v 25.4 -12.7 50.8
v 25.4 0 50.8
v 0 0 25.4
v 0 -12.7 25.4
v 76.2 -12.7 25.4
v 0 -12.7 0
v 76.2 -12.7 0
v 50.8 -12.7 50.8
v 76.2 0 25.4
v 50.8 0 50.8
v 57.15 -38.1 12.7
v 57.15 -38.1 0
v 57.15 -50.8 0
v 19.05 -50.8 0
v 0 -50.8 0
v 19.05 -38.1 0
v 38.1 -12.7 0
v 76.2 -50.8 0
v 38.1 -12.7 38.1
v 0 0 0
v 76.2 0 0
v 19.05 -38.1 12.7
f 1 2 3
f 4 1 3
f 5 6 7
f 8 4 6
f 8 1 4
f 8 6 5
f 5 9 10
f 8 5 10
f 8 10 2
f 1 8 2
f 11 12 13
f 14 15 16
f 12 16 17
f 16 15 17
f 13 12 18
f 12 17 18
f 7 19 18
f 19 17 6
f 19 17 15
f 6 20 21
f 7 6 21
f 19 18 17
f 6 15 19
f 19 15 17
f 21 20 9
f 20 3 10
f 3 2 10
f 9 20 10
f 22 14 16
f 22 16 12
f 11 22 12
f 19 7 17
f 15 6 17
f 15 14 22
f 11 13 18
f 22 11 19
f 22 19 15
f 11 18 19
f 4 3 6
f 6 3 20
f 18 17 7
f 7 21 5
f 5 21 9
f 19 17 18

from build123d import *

# Parameters (mm, degrees)
F1_DEPTH       = 12.7
F3_DEPTH       = 38.1
F5_DEPTH       = 76.201
F7_DEPTH       = 38.1
F9_DEPTH       = 25.4
F9_DEPTH_BACK  = 25.4
F10_DEPTH      = 25.4
F10_DEPTH_BACK = 25.4


with BuildPart() as f1:
    # F0 (on Front) → F1 (new body)
    with BuildSketch(Plane.XZ):
        Polygon((0, 25.4), (0, 0), (76.2, 0), (76.2, 25.4), (50.8, 50.8), (25.4, 50.8), align=None)
    extrude(amount=F1_DEPTH)


with BuildPart() as f3:
    # F2 (on Top) → F3 (new body)
    with BuildSketch(Plane.XY):
        Polygon((38.1, -12.7), (0, -50.8), (19.05, -50.8), (19.05, -38.1), (57.15, -38.1), (57.15, -50.8), (76.2, -50.8), align=None)
    extrude(amount=F3_DEPTH)

    # F4 (on face) → F5 (cut, through all)
    with BuildSketch(Plane.YZ.offset(76.2)):
        Polygon((-50.8, 38.1), (-50.8, 0), (-12.7, 38.1), align=None)
    extrude(amount=-F5_DEPTH, mode=Mode.SUBTRACT)


with BuildPart() as f7:
    # F6 (on Top) → F7 (new body)
    with BuildSketch(Plane.XY):
        Polygon((38.1, -12.7), (0, -12.7), (0, -50.8), align=None)
    extrude(amount=F7_DEPTH)

    # F8 (on face) → F9 (cut, two sides)
    with BuildSketch(Plane.XZ.offset(38.1)) as f9_sk:
        Polygon((0, 0), (38.1, 38.1), (0, 38.1), align=None)
    extrude(amount=-F9_DEPTH, mode=Mode.SUBTRACT)
    extrude(f9_sk.sketch, amount=F9_DEPTH_BACK, mode=Mode.SUBTRACT)


with BuildPart() as f7b:
    # F6 (on Top) → F7, piece 2 (new body)
    with BuildSketch(Plane.XY):
        Polygon((76.2, -12.7), (38.1, -12.7), (76.2, -50.8), align=None)
    extrude(amount=F7_DEPTH)

    # F8 (on face) → F10 (cut, two sides)
    with BuildSketch(Plane.XZ.offset(38.1)) as f10_sk:
        Polygon((76.2, 38.1), (38.1, 38.1), (76.2, 0), align=None)
    extrude(amount=-F10_DEPTH, mode=Mode.SUBTRACT)
    extrude(f10_sk.sketch, amount=F10_DEPTH_BACK, mode=Mode.SUBTRACT)


solid = Compound([f1.part, f3.part, f7.part, f7b.part])
